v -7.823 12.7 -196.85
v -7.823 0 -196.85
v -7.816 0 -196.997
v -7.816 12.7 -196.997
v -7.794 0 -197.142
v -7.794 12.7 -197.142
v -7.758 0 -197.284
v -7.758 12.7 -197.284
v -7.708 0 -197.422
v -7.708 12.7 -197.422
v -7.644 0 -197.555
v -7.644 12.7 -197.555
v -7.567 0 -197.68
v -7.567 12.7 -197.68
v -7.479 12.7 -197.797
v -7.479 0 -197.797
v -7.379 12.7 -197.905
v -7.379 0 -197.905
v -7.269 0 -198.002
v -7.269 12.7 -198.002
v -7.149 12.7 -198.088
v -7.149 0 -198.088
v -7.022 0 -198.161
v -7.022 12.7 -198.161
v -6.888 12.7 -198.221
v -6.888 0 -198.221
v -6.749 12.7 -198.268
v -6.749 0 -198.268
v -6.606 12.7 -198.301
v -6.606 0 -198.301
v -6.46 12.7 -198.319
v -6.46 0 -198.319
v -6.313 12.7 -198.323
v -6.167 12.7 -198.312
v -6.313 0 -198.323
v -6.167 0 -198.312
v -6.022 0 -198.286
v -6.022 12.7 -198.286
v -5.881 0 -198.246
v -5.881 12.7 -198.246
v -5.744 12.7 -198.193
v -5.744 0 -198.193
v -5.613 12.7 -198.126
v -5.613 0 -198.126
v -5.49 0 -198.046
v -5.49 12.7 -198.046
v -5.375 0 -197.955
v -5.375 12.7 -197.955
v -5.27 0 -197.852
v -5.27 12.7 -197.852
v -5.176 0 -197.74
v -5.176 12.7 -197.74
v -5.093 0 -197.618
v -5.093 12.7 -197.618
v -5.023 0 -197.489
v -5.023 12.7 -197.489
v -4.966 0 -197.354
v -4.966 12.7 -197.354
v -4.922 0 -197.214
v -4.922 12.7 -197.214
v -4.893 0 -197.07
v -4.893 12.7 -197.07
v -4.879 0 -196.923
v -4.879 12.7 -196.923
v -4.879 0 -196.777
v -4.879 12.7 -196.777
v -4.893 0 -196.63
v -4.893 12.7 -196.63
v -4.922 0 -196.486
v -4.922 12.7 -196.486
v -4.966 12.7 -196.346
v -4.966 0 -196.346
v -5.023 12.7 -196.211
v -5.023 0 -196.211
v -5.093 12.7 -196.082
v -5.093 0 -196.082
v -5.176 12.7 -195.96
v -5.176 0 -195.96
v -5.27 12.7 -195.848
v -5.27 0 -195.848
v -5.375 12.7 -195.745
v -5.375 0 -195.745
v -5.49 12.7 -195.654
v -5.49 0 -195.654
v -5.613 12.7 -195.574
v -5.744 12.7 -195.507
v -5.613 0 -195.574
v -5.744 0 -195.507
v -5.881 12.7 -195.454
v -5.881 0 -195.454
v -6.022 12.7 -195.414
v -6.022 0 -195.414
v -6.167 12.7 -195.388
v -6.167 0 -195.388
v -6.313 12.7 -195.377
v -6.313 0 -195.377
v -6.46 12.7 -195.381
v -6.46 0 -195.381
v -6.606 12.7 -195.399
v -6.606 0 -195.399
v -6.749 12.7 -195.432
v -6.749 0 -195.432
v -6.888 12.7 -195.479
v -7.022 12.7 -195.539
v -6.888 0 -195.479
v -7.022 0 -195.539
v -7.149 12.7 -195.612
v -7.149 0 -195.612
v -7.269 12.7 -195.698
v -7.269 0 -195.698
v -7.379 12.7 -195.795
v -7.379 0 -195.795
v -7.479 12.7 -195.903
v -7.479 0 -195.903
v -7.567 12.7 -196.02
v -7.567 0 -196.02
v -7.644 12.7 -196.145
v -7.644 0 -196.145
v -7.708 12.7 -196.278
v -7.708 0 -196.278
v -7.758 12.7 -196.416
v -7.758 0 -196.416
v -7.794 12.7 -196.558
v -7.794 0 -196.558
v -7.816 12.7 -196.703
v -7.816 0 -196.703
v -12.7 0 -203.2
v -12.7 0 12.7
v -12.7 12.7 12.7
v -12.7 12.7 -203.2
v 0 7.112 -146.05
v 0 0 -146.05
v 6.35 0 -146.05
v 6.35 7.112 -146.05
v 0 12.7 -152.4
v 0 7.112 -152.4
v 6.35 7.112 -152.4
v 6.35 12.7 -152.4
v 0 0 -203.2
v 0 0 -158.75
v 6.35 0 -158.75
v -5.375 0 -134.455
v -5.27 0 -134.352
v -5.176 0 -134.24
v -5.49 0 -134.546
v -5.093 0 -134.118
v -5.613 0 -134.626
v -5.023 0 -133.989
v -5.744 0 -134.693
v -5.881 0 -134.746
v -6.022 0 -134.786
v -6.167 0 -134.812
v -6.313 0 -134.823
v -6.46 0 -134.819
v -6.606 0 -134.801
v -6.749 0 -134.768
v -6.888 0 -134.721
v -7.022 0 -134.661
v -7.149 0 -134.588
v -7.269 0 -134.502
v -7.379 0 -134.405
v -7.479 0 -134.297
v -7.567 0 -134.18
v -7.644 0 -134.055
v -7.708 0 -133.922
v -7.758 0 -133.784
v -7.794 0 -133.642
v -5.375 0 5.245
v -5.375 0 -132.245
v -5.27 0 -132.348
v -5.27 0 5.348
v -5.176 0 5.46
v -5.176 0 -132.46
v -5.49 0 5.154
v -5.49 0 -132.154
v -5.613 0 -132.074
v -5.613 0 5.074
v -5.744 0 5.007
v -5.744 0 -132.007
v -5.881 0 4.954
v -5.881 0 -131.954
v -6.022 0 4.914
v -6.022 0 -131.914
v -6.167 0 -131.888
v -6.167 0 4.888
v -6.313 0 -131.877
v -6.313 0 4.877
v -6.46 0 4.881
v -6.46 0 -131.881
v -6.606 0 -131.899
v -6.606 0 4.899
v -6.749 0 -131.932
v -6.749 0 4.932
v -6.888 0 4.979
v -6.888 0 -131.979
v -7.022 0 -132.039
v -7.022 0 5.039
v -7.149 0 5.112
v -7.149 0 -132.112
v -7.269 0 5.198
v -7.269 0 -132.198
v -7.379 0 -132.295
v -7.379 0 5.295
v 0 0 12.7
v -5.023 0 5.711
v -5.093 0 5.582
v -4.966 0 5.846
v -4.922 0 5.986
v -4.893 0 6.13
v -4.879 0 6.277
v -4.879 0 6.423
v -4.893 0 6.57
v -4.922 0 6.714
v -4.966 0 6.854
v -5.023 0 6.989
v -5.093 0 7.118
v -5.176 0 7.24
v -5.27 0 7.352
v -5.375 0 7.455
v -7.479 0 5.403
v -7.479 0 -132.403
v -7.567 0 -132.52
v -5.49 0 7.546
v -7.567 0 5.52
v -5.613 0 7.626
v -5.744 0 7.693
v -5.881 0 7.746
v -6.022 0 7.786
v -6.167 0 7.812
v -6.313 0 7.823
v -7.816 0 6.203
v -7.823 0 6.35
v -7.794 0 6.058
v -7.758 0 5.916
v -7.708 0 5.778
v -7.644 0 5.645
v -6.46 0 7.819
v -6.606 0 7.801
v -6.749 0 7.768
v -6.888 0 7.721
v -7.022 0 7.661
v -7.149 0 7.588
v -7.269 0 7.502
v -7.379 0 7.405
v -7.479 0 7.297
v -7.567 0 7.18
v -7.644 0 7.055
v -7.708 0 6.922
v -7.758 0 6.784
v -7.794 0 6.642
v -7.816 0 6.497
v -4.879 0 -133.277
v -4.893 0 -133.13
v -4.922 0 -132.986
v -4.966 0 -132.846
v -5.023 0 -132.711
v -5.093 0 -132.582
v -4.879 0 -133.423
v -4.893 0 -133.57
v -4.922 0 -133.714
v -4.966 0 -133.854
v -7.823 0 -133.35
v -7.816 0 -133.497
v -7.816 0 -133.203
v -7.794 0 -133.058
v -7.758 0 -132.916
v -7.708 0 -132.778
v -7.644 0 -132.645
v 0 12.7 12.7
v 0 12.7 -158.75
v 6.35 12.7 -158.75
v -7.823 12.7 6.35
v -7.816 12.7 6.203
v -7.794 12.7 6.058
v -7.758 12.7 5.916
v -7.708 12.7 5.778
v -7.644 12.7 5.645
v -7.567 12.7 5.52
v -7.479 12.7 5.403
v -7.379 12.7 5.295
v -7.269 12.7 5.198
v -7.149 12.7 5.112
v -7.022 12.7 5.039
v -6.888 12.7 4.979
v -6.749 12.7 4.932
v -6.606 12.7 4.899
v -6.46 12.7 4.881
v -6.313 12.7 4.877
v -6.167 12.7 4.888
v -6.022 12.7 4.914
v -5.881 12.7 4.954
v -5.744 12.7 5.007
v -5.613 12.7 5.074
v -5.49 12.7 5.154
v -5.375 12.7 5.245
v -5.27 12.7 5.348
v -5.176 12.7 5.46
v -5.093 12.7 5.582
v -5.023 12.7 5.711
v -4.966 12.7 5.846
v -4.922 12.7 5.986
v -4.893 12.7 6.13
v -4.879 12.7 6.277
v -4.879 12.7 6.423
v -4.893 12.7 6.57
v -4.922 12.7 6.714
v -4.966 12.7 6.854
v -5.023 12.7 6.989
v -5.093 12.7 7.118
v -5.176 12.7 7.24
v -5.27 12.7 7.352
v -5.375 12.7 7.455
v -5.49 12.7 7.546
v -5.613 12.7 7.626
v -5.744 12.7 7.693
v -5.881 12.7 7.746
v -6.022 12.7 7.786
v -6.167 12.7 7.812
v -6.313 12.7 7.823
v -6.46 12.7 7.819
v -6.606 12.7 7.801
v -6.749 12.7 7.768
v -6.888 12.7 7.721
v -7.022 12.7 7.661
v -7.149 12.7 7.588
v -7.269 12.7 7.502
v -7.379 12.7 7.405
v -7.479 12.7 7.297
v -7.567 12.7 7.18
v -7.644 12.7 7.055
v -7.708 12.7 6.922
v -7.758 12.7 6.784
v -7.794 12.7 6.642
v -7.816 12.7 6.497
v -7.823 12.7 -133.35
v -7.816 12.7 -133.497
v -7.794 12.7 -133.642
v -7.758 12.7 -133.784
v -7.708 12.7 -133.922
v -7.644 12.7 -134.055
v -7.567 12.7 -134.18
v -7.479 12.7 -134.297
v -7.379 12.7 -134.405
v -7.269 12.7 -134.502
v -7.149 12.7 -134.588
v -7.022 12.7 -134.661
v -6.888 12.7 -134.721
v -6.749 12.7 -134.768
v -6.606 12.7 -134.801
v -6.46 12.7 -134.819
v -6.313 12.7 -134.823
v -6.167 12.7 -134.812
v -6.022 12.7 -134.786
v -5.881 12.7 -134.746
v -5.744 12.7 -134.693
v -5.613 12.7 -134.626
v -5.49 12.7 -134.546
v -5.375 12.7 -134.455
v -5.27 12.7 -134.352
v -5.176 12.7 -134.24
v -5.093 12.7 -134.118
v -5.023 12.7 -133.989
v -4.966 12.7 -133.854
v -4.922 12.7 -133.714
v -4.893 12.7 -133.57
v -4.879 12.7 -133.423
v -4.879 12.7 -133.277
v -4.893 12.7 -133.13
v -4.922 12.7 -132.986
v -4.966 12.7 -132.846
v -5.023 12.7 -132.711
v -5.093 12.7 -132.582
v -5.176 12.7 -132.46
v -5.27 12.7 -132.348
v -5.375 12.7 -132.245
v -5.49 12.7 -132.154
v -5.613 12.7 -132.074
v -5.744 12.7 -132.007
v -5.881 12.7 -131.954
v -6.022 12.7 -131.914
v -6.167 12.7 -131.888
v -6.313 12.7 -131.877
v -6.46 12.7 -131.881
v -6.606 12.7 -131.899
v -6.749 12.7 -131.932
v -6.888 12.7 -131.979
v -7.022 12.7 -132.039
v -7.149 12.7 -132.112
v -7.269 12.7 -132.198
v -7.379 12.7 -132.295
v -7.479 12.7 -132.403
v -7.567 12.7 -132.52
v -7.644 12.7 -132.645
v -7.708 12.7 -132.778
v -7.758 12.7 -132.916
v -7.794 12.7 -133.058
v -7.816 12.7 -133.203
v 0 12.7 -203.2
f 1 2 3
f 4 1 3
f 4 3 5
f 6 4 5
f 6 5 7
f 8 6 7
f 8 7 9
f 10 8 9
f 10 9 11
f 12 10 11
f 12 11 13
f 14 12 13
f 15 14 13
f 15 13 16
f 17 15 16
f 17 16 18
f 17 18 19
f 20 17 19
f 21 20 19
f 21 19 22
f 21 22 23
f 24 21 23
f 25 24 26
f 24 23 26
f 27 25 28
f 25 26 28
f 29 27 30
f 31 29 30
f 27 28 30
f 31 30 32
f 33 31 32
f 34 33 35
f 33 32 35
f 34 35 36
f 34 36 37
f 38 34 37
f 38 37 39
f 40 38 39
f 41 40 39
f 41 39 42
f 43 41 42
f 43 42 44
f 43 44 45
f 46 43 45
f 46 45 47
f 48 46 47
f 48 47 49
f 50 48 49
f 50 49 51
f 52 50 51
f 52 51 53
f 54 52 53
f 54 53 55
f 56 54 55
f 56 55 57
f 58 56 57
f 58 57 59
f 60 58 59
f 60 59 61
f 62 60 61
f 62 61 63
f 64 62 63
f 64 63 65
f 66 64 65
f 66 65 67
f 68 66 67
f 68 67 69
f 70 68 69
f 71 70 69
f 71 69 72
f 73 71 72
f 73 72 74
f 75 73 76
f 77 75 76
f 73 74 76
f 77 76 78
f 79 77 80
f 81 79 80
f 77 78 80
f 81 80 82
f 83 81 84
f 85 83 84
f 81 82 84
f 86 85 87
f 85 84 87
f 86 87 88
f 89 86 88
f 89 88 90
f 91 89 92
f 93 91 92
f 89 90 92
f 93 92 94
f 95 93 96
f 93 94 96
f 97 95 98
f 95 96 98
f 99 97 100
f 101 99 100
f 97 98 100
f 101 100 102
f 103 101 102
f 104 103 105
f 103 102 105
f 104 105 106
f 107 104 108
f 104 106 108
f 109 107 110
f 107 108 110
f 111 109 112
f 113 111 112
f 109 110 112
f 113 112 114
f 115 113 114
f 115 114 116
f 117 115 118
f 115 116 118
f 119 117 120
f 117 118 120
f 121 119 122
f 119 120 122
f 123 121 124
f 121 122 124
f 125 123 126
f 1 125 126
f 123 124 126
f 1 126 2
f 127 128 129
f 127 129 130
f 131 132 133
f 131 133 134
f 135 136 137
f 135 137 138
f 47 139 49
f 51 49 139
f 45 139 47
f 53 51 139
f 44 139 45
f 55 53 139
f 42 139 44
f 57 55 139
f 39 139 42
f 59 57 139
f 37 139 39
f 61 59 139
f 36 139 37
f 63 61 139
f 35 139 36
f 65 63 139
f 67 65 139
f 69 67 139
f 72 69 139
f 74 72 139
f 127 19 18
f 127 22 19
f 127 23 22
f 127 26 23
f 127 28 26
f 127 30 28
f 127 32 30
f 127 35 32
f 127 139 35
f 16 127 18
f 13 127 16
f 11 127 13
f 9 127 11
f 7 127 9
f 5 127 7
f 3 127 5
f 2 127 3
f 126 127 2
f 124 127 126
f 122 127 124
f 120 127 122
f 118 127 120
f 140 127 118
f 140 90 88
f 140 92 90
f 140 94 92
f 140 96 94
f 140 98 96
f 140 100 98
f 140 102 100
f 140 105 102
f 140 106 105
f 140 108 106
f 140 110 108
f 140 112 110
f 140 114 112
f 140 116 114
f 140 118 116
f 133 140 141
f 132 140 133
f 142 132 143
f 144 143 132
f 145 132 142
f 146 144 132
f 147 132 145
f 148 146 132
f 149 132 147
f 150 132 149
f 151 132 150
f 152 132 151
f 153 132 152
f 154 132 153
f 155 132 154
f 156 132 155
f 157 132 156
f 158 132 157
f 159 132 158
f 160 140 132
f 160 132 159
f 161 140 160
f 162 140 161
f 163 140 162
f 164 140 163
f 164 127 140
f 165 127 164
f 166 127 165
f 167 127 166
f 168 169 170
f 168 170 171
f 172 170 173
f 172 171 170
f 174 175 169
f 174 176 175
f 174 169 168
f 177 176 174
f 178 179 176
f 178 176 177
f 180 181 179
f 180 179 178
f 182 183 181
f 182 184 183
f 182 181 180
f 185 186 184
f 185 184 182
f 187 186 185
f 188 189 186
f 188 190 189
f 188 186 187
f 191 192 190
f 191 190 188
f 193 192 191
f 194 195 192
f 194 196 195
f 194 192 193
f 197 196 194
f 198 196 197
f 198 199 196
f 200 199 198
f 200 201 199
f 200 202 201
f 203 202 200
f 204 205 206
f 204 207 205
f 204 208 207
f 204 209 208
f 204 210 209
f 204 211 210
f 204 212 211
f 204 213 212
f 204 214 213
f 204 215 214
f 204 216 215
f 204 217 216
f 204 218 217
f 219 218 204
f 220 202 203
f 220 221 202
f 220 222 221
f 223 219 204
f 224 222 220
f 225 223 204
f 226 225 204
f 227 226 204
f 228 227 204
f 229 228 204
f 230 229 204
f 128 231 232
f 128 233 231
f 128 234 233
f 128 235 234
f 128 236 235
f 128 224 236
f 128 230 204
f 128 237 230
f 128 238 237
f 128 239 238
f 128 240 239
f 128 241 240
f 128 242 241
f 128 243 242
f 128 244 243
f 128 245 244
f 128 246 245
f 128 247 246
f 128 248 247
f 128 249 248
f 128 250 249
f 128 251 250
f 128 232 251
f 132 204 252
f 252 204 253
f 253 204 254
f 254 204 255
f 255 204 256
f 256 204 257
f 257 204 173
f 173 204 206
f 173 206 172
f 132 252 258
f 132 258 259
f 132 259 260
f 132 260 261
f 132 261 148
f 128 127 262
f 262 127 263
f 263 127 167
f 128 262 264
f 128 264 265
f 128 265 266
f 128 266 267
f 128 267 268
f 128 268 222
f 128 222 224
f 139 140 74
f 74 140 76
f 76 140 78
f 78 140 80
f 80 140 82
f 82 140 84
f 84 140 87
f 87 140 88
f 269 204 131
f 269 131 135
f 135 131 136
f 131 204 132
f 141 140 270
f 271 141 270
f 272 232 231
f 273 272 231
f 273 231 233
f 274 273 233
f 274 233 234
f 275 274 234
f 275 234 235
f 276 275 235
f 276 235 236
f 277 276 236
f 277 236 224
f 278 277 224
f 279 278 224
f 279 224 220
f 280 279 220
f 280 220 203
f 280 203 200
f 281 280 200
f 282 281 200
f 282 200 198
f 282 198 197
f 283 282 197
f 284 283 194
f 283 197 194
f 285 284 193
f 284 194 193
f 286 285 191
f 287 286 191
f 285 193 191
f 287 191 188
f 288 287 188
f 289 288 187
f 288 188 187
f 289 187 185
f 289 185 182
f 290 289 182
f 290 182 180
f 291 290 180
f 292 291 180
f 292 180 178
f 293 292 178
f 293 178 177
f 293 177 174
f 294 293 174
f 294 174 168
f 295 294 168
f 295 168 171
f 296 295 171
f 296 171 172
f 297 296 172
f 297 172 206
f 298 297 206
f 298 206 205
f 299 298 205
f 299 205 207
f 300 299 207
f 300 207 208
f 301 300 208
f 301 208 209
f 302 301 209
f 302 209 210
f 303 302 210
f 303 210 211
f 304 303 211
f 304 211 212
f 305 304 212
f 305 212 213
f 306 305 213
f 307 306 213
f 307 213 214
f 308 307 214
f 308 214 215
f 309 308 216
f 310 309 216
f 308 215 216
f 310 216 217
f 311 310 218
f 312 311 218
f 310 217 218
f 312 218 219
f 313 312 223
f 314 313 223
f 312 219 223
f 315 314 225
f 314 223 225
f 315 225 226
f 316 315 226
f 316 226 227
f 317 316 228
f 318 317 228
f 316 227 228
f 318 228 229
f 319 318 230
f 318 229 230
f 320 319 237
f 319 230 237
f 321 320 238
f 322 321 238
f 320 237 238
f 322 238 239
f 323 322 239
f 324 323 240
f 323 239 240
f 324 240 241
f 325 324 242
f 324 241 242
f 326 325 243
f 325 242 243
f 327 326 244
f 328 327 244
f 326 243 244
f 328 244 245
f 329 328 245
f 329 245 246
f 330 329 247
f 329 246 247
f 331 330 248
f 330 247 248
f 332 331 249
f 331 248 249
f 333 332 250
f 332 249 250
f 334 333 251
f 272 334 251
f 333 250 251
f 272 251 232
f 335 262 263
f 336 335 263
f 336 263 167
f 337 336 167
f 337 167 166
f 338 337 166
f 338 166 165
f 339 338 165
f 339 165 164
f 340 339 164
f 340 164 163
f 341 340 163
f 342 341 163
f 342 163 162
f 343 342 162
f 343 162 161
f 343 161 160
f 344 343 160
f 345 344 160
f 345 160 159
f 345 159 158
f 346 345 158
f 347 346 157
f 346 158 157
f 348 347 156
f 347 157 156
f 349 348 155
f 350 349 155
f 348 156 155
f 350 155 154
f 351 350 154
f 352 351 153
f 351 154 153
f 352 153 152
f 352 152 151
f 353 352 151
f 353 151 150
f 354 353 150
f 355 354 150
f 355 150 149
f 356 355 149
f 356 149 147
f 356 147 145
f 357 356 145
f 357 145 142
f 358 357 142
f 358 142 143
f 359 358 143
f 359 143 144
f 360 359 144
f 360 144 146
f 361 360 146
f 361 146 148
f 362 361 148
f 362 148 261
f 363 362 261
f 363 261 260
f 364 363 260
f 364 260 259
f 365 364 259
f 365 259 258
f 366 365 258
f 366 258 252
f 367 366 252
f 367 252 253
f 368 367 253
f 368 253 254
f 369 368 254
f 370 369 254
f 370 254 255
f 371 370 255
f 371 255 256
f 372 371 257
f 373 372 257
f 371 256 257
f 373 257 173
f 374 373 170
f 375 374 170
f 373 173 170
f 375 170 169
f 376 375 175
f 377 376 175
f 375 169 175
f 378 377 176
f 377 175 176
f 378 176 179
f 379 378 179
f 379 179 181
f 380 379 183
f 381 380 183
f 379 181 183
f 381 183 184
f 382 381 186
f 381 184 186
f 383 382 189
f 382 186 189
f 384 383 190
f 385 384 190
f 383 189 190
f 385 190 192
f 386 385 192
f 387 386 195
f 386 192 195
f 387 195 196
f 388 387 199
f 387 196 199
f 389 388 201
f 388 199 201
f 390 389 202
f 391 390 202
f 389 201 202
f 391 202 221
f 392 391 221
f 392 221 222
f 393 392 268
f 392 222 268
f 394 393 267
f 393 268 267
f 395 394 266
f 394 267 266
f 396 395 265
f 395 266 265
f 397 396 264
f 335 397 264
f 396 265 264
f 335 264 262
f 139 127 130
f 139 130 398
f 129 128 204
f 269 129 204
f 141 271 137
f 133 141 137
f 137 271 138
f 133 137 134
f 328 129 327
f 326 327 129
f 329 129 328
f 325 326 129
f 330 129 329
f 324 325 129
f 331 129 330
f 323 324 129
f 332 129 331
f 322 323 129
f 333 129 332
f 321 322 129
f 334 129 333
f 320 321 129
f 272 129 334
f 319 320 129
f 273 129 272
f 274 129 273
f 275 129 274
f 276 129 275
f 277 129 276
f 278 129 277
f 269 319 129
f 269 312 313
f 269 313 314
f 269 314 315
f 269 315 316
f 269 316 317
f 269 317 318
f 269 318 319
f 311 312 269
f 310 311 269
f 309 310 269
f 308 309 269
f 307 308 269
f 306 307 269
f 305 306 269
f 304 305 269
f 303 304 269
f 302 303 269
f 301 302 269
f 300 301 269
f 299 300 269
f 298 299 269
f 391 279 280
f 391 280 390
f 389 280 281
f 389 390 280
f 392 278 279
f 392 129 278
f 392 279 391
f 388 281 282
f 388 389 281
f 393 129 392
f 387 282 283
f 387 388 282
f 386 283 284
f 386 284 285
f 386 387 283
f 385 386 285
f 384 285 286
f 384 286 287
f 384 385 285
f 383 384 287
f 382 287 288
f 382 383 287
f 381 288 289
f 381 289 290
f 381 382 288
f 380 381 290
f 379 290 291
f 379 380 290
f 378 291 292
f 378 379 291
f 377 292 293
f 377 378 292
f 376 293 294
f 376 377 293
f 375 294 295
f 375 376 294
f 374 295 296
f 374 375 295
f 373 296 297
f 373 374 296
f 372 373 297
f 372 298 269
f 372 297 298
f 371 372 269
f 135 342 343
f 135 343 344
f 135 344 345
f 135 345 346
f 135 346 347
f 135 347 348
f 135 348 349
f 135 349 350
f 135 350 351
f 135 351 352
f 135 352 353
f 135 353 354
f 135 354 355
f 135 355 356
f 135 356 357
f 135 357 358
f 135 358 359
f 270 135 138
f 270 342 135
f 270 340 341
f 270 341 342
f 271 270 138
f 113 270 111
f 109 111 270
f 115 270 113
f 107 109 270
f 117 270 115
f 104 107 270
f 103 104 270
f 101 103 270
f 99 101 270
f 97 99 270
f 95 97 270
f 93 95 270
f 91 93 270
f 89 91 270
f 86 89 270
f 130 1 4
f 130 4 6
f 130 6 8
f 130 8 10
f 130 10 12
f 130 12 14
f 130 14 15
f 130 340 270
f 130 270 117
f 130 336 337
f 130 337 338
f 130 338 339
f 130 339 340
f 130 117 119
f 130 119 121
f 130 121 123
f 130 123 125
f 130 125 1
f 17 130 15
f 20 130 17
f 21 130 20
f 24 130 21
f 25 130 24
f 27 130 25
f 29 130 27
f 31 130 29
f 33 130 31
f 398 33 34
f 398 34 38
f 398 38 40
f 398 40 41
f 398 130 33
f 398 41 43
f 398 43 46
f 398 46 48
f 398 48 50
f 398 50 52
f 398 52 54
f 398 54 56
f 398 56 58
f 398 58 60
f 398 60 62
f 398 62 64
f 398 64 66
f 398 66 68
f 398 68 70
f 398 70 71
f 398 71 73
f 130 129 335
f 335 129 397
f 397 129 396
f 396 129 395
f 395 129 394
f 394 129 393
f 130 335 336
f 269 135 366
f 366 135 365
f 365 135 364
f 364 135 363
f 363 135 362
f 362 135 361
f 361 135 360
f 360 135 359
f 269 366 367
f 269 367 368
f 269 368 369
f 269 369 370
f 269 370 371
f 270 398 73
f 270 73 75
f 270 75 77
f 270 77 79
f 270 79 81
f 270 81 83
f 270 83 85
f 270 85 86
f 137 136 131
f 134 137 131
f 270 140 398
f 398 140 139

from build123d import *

# Parameters (mm, degrees)
SKETCH18_W                  = 12.7
SKETCH18_H                  = 215.9
BOSS_EXTRUDE3_DEPTH         = 12.7
F_32_0_116_DIAMETER_HOLE7_D = 2.9464
SKETCH29_W                  = 6.35
SKETCH29_H                  = 12.7
BOSS_EXTRUDE4_DEPTH         = 6.35
SKETCH30_W                  = 6.35
SKETCH30_H                  = 7.112
BOSS_EXTRUDE5_DEPTH         = 6.35
SKETCH33_W                  = 12.7
SKETCH33_H                  = 12.7
CUT_EXTRUDE1_DEPTH          = 6.35


with BuildPart() as part:
    # Sketch18 → Boss-Extrude3 (new body)
    with BuildSketch(Plane(origin=(0, 0, 0), x_dir=(1, 0, 0), z_dir=(0, 1, 0))):
        with Locations((-6.35, 95.25)):
            Rectangle(SKETCH18_W, SKETCH18_H)
    extrude(amount=BOSS_EXTRUDE3_DEPTH)

    # #32 (0.116) Diameter Hole7 (through all)
    with Locations(Plane(origin=(0, 12.7, 0), x_dir=(1, 0, 0), z_dir=(0, 1, 0))):
        with Locations((-6.35, 196.85), (-6.35, 133.35), (-6.35, -6.35)):
            Hole(F_32_0_116_DIAMETER_HOLE7_D / 2)

    # Sketch29 → Boss-Extrude4 (add)
    with BuildSketch(Plane.ZY.offset(12.7)):
        with Locations((-155.575, 6.35)):
            Rectangle(SKETCH29_W, SKETCH29_H)
    boss_extrude4 = extrude(amount=BOSS_EXTRUDE4_DEPTH)

    # Sketch30 → Boss-Extrude5 (add)
    with BuildSketch(Plane.ZY.offset(12.7)):
        with Locations((-149.225, 3.556)):
            Rectangle(SKETCH30_W, SKETCH30_H)
    boss_extrude5 = extrude(amount=BOSS_EXTRUDE5_DEPTH)

    # Mirror2: Boss-Extrude4, Boss-Extrude5 across plane
    add(boss_extrude4.mirror(Plane.ZY.offset(6.35)))
    add(boss_extrude5.mirror(Plane.ZY.offset(6.35)))

    # Sketch33 → Cut-Extrude1 (cut)
    with BuildSketch(Plane.ZY.offset(19.05)):
        with Locations((-152.4, 6.35)):
            Rectangle(SKETCH33_W, SKETCH33_H)
    extrude(amount=-CUT_EXTRUDE1_DEPTH, mode=Mode.SUBTRACT)


solid = part.part
